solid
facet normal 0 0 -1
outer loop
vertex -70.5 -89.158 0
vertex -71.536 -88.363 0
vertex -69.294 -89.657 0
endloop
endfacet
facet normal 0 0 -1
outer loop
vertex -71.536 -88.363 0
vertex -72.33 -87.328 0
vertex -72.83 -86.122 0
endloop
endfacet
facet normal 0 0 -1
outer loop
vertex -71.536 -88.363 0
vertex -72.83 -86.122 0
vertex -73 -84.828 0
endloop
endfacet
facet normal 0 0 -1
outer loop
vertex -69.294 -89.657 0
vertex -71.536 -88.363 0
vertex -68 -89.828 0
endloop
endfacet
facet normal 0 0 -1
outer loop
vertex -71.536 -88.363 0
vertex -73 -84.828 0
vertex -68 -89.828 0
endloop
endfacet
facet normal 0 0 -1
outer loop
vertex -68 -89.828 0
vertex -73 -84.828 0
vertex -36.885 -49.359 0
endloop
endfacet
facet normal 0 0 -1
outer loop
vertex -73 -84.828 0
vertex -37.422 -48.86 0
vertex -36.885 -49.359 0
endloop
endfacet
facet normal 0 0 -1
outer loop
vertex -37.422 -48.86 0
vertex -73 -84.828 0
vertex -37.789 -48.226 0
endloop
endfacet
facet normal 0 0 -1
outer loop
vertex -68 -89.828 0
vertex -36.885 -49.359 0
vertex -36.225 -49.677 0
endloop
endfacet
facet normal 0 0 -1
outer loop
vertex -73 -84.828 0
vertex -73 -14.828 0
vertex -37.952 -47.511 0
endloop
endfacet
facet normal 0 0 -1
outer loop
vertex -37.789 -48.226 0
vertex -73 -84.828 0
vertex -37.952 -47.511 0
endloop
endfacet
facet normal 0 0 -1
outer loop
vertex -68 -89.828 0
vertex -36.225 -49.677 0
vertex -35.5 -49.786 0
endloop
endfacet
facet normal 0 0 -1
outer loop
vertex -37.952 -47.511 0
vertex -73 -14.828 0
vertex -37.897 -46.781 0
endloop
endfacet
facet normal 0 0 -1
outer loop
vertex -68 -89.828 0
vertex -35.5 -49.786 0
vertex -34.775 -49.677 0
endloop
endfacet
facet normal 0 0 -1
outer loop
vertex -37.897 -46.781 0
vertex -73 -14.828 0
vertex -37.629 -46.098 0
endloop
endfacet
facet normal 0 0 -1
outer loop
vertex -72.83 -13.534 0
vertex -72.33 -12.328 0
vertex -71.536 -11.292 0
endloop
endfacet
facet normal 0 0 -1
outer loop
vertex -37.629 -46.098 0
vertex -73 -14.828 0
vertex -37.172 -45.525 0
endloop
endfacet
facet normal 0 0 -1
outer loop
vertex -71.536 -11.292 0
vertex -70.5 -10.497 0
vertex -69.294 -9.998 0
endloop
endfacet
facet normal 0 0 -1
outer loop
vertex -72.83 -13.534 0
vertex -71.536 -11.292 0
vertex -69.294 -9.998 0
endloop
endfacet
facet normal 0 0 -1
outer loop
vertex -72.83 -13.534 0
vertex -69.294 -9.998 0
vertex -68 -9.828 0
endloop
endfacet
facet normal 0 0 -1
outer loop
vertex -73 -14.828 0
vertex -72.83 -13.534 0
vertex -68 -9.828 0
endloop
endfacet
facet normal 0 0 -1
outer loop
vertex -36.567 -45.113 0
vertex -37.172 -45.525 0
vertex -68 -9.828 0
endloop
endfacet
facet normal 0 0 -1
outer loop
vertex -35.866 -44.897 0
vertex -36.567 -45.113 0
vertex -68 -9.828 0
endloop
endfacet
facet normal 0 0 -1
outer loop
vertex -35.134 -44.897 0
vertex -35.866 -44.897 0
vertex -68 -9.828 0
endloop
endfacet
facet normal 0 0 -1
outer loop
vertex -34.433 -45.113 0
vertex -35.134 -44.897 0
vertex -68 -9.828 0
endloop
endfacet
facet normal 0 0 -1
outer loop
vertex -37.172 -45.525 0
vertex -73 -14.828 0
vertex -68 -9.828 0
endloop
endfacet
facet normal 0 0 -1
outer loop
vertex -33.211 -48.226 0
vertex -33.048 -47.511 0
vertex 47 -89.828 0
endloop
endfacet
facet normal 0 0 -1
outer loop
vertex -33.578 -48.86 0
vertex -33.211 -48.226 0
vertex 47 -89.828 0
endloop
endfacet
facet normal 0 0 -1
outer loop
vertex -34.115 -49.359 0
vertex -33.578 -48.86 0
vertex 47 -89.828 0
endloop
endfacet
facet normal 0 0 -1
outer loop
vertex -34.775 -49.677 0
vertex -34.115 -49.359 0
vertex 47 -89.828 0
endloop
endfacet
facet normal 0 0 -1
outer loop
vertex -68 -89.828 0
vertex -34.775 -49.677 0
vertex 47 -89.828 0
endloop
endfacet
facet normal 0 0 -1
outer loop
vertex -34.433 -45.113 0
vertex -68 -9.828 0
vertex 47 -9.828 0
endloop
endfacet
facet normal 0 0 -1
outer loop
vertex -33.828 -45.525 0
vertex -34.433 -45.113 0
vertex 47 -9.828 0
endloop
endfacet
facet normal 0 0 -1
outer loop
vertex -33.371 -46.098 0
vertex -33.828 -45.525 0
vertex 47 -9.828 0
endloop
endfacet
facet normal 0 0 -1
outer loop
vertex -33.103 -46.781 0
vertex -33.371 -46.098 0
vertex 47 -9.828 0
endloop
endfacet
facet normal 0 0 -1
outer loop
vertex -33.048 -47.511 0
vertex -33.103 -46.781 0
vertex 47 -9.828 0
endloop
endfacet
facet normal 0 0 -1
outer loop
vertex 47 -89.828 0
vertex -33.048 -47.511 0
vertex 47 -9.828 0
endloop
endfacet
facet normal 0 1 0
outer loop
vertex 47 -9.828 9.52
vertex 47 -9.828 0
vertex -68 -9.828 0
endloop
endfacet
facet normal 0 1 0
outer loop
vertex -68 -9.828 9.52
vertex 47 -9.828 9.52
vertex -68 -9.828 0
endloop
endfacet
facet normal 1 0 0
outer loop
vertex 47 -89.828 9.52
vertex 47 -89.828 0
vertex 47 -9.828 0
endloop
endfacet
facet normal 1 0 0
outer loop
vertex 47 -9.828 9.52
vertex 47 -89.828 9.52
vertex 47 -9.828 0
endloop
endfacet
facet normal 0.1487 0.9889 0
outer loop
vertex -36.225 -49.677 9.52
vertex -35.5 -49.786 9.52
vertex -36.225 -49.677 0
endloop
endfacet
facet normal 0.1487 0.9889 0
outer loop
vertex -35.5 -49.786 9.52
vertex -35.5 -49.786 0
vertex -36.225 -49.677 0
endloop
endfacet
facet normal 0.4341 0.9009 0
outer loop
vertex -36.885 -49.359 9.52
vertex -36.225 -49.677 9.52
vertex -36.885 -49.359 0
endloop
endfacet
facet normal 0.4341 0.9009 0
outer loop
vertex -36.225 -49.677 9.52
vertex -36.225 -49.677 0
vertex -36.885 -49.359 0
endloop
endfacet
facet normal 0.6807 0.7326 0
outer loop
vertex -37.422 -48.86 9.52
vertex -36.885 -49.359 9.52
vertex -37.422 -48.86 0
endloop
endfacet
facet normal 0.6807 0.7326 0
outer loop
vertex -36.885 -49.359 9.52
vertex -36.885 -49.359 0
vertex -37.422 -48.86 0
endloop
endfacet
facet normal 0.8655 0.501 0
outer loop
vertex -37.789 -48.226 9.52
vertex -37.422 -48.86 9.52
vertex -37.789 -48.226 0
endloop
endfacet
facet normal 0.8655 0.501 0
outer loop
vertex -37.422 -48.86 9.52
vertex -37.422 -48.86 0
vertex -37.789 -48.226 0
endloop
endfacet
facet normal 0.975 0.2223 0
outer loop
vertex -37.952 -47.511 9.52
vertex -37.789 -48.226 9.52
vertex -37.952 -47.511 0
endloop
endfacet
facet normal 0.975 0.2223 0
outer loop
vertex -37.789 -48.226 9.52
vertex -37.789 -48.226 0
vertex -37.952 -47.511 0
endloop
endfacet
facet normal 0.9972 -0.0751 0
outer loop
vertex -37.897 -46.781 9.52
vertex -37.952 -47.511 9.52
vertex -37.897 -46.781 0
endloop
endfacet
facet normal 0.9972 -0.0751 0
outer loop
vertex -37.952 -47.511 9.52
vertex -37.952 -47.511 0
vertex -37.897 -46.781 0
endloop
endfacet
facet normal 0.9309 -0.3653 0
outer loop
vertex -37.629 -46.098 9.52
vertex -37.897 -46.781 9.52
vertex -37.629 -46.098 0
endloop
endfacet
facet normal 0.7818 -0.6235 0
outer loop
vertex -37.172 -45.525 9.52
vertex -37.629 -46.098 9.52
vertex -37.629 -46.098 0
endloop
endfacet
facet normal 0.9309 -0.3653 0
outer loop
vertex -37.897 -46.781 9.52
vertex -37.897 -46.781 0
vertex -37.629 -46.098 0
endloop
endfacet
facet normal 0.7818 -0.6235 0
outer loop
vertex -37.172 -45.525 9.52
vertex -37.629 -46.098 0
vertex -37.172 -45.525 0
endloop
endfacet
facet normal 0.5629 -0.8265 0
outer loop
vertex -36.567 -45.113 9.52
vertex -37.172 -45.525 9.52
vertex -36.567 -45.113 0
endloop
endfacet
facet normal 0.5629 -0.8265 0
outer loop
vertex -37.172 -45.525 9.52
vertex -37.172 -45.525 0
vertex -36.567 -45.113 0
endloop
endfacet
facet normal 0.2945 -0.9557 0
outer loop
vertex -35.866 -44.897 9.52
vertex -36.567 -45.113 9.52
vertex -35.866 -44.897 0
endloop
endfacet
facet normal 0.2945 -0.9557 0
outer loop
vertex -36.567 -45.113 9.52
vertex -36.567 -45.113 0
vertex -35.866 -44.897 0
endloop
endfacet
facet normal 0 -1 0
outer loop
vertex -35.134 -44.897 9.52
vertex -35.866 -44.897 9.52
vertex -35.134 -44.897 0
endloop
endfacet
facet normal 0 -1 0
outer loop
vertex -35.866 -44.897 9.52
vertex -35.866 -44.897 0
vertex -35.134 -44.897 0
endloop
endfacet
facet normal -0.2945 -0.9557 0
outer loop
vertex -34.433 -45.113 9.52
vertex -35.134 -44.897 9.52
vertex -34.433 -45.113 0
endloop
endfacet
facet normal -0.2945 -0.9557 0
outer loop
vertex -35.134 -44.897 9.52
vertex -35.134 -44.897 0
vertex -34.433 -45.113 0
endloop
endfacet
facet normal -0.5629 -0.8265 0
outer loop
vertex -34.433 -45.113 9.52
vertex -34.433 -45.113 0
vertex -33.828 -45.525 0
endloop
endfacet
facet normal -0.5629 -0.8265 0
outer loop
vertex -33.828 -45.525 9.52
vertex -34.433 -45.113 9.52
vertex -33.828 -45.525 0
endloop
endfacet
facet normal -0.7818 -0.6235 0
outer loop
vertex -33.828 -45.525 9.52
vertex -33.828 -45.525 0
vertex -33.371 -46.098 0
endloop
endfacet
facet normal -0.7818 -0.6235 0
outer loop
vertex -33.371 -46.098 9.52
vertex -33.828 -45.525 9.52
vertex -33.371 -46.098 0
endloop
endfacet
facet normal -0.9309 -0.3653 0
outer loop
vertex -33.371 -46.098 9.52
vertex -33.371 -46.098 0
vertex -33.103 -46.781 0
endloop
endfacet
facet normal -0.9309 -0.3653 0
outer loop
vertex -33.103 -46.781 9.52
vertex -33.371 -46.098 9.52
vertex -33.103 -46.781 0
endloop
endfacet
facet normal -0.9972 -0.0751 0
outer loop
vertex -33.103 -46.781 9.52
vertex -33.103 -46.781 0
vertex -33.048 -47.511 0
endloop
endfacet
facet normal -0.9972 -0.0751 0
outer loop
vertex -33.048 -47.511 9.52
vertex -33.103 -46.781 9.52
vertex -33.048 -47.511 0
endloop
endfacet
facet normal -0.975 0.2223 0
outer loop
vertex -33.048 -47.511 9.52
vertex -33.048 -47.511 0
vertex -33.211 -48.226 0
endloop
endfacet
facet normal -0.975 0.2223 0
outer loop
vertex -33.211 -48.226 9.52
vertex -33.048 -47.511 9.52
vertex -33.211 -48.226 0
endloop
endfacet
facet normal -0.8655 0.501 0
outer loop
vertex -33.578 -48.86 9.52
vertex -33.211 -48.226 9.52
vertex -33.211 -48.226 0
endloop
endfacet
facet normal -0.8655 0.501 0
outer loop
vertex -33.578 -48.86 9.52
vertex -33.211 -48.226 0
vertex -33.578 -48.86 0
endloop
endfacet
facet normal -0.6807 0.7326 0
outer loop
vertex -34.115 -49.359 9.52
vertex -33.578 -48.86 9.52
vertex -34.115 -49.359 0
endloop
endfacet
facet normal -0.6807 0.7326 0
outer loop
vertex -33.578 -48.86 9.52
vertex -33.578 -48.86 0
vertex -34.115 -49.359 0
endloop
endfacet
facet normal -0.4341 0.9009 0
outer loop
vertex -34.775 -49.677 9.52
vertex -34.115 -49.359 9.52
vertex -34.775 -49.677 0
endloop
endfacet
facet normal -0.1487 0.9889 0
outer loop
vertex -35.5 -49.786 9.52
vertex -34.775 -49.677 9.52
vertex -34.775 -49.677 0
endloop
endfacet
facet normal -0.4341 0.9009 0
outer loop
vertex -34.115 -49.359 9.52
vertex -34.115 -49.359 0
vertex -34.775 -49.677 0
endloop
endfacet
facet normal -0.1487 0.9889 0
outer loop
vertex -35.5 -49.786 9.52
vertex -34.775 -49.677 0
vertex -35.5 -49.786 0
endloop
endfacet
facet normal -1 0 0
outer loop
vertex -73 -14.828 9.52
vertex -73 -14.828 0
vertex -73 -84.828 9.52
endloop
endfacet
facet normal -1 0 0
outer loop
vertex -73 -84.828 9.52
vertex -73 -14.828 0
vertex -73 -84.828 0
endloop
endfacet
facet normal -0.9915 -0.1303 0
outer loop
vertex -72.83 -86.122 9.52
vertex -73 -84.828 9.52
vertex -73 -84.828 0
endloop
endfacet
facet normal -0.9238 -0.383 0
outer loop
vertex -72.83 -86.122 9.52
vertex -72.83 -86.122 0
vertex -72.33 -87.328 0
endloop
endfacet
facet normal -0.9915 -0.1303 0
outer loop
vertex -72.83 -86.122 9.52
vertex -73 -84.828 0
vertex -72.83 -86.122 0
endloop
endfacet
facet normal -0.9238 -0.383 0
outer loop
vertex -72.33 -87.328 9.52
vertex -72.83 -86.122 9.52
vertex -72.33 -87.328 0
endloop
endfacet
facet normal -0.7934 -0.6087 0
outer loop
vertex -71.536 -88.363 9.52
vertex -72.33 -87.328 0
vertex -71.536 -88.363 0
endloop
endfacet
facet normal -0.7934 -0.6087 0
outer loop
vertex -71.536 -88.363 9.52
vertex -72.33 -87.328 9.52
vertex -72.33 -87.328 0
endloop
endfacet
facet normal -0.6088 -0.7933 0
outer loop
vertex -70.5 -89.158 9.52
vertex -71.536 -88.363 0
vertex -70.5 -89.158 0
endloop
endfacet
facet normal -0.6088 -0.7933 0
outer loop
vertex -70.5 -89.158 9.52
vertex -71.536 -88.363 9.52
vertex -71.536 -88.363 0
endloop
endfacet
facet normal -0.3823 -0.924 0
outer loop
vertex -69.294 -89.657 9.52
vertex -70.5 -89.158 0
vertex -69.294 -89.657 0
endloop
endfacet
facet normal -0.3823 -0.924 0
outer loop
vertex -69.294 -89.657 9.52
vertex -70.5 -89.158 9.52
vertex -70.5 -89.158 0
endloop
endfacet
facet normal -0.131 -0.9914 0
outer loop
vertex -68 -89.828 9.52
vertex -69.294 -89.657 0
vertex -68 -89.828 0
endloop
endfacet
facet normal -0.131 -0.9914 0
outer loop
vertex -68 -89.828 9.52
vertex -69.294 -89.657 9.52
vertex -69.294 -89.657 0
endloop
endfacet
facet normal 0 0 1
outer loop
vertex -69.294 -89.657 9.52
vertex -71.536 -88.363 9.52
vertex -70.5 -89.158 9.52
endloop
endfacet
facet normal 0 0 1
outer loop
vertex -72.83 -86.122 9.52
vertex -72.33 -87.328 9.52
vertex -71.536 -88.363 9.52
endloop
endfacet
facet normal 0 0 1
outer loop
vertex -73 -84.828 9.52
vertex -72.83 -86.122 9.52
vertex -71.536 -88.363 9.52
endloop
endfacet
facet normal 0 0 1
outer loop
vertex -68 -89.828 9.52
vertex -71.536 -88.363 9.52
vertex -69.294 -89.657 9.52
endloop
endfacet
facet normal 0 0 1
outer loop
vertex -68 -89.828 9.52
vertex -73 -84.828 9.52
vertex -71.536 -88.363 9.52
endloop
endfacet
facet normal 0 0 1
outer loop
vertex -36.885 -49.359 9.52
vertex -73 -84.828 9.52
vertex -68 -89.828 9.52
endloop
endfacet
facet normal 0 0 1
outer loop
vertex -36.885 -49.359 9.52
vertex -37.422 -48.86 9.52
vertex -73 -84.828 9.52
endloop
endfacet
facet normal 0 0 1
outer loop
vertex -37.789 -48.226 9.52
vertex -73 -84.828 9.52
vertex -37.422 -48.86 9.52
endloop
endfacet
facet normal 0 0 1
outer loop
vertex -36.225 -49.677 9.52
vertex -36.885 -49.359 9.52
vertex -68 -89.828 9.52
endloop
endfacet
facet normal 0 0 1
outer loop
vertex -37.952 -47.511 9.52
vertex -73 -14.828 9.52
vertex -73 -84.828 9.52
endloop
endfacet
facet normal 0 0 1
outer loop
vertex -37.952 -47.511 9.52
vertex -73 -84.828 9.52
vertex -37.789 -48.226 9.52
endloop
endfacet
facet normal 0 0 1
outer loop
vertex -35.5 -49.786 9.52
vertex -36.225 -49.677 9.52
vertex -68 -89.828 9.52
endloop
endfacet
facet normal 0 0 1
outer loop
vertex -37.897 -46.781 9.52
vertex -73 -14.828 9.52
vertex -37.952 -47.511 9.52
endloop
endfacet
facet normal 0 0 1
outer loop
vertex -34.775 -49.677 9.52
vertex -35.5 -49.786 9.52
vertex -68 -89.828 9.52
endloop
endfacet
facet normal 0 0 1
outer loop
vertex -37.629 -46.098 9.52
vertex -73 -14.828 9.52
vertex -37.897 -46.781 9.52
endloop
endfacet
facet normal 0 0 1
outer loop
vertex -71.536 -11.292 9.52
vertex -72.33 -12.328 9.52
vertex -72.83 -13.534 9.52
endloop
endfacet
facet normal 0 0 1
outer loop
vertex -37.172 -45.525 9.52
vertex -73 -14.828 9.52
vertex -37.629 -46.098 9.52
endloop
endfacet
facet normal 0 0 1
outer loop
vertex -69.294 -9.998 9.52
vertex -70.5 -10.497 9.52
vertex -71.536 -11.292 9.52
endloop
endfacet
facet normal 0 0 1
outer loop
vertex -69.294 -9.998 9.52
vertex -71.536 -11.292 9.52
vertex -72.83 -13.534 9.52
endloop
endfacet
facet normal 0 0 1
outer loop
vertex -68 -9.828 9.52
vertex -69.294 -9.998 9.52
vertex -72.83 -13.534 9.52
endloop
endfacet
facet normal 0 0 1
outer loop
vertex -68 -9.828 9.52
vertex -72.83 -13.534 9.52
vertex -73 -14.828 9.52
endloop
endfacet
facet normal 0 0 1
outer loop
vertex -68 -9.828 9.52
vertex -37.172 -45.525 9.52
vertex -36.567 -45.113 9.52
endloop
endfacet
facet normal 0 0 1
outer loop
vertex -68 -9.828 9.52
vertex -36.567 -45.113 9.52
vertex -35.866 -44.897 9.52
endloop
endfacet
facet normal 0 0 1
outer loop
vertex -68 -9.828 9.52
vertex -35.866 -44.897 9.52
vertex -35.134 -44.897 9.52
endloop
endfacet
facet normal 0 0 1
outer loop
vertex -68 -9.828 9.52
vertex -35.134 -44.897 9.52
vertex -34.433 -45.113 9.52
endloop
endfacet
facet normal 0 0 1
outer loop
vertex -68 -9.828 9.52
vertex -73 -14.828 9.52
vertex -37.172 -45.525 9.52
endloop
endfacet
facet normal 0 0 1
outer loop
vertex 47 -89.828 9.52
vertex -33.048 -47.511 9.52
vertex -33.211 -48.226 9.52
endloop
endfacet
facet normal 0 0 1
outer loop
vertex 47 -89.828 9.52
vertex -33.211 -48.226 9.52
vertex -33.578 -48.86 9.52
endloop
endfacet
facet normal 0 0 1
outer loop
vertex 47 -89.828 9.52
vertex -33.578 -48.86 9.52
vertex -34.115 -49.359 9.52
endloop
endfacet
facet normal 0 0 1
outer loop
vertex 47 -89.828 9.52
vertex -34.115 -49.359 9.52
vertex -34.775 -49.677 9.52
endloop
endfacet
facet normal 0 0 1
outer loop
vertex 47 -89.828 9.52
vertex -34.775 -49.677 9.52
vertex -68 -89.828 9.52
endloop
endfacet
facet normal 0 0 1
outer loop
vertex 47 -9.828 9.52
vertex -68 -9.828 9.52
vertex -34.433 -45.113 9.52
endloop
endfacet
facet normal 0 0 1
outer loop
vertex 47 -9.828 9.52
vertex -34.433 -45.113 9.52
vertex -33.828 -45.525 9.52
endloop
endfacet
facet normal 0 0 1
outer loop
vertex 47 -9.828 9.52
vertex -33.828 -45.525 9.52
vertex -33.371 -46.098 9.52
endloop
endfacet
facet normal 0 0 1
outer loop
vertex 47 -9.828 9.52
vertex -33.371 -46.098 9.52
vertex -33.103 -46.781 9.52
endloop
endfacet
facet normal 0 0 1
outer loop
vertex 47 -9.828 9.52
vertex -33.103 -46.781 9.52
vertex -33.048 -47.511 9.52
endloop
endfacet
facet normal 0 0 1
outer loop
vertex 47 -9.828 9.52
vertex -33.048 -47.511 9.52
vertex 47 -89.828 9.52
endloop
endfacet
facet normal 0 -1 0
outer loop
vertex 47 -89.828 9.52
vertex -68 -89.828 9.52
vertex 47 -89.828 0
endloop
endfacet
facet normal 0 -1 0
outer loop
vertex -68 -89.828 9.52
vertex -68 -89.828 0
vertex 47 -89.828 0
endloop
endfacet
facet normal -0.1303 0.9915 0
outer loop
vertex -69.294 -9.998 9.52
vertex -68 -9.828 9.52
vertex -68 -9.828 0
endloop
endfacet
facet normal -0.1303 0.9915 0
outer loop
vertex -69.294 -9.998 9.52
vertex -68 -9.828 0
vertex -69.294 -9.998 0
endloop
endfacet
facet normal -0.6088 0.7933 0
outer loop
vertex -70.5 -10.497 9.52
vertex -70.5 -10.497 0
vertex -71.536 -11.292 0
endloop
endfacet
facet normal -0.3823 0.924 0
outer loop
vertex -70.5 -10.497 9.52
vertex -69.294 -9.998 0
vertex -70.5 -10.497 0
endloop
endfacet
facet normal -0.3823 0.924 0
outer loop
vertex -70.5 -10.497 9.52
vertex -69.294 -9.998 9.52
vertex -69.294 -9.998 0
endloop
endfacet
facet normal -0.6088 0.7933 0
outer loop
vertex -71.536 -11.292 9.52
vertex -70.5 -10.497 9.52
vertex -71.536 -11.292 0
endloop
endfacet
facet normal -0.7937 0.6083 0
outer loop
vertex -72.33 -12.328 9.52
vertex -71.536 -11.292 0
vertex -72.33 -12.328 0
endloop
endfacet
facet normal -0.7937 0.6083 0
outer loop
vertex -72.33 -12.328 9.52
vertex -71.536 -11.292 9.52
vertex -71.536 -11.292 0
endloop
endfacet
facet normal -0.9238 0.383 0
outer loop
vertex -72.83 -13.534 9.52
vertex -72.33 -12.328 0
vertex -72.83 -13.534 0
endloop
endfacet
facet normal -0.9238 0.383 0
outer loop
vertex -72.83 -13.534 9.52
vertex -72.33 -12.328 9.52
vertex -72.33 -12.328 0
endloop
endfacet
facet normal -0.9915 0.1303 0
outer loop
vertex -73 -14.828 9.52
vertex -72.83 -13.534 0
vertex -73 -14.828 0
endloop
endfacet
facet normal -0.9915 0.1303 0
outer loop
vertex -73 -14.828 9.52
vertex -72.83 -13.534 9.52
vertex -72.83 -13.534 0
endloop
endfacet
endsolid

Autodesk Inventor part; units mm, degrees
ref_plane "YZ Plane" through (0, 0, 0) normal (1, 0, 0) x (0, 1, 0)
ref_plane "XZ Plane" through (0, 0, 0) normal (0, 1, 0) x (-1, 0, 0)
ref_plane "XY Plane" through (0, 0, 0) normal (0, 0, 1) x (1, 0, 0)
sketch "Esboço1" plane through (0, 0, 0) normal (0, 0, 1) x (1, 0, 0)
  line L0 (-33, -50) -> (-33, 950) projected
  line L1 (47, -50) -> (47, 950) projected
  line L2 (-73, -89.8276) -> (47, -89.8276)
  line L3 (47, -9.8276) -> (-73, -9.8276)
  line L4 (-73, -9.8276) -> (-73, -89.8276)
  line L5 (47, -89.8276) -> (47, -9.8276)
  point P0 (0, 0)
  dimension "d0" = 120
  dimension "d1" = 120
  dimension "d2" = 80
extrude "Extrusão1" add sketch "Esboço1" along normal blind 9.52
sketch "Esboço11" plane through (0, 0, 9.52) normal (0, 0, 1) x (1, 0, 0)
  circle A0 centre (-35.5, -47.3276) radius 3
  line L0 (-73, -9.8276) -> (-73, -89.8276) projected
  point P0 (0, 0)
  dimension "d95" = 6
  dimension "d104" = 37.5
hole "Furo2" at (-35.5, -47.3276, 9.52) direction (0, 0, -1) diameter 4.917 end through all thread size "M6x1" class "6H" standard "ANSI Metric M Profile"
fillet "Arredondamento3" radius 5 2 edges at (-73, -89.8276, 4.76) (-73, -9.8276, 4.76)
equation "\"d0\" = d1"
properties part number "SUPORTE_GUIA_CORREIA_EIXO_Y"
